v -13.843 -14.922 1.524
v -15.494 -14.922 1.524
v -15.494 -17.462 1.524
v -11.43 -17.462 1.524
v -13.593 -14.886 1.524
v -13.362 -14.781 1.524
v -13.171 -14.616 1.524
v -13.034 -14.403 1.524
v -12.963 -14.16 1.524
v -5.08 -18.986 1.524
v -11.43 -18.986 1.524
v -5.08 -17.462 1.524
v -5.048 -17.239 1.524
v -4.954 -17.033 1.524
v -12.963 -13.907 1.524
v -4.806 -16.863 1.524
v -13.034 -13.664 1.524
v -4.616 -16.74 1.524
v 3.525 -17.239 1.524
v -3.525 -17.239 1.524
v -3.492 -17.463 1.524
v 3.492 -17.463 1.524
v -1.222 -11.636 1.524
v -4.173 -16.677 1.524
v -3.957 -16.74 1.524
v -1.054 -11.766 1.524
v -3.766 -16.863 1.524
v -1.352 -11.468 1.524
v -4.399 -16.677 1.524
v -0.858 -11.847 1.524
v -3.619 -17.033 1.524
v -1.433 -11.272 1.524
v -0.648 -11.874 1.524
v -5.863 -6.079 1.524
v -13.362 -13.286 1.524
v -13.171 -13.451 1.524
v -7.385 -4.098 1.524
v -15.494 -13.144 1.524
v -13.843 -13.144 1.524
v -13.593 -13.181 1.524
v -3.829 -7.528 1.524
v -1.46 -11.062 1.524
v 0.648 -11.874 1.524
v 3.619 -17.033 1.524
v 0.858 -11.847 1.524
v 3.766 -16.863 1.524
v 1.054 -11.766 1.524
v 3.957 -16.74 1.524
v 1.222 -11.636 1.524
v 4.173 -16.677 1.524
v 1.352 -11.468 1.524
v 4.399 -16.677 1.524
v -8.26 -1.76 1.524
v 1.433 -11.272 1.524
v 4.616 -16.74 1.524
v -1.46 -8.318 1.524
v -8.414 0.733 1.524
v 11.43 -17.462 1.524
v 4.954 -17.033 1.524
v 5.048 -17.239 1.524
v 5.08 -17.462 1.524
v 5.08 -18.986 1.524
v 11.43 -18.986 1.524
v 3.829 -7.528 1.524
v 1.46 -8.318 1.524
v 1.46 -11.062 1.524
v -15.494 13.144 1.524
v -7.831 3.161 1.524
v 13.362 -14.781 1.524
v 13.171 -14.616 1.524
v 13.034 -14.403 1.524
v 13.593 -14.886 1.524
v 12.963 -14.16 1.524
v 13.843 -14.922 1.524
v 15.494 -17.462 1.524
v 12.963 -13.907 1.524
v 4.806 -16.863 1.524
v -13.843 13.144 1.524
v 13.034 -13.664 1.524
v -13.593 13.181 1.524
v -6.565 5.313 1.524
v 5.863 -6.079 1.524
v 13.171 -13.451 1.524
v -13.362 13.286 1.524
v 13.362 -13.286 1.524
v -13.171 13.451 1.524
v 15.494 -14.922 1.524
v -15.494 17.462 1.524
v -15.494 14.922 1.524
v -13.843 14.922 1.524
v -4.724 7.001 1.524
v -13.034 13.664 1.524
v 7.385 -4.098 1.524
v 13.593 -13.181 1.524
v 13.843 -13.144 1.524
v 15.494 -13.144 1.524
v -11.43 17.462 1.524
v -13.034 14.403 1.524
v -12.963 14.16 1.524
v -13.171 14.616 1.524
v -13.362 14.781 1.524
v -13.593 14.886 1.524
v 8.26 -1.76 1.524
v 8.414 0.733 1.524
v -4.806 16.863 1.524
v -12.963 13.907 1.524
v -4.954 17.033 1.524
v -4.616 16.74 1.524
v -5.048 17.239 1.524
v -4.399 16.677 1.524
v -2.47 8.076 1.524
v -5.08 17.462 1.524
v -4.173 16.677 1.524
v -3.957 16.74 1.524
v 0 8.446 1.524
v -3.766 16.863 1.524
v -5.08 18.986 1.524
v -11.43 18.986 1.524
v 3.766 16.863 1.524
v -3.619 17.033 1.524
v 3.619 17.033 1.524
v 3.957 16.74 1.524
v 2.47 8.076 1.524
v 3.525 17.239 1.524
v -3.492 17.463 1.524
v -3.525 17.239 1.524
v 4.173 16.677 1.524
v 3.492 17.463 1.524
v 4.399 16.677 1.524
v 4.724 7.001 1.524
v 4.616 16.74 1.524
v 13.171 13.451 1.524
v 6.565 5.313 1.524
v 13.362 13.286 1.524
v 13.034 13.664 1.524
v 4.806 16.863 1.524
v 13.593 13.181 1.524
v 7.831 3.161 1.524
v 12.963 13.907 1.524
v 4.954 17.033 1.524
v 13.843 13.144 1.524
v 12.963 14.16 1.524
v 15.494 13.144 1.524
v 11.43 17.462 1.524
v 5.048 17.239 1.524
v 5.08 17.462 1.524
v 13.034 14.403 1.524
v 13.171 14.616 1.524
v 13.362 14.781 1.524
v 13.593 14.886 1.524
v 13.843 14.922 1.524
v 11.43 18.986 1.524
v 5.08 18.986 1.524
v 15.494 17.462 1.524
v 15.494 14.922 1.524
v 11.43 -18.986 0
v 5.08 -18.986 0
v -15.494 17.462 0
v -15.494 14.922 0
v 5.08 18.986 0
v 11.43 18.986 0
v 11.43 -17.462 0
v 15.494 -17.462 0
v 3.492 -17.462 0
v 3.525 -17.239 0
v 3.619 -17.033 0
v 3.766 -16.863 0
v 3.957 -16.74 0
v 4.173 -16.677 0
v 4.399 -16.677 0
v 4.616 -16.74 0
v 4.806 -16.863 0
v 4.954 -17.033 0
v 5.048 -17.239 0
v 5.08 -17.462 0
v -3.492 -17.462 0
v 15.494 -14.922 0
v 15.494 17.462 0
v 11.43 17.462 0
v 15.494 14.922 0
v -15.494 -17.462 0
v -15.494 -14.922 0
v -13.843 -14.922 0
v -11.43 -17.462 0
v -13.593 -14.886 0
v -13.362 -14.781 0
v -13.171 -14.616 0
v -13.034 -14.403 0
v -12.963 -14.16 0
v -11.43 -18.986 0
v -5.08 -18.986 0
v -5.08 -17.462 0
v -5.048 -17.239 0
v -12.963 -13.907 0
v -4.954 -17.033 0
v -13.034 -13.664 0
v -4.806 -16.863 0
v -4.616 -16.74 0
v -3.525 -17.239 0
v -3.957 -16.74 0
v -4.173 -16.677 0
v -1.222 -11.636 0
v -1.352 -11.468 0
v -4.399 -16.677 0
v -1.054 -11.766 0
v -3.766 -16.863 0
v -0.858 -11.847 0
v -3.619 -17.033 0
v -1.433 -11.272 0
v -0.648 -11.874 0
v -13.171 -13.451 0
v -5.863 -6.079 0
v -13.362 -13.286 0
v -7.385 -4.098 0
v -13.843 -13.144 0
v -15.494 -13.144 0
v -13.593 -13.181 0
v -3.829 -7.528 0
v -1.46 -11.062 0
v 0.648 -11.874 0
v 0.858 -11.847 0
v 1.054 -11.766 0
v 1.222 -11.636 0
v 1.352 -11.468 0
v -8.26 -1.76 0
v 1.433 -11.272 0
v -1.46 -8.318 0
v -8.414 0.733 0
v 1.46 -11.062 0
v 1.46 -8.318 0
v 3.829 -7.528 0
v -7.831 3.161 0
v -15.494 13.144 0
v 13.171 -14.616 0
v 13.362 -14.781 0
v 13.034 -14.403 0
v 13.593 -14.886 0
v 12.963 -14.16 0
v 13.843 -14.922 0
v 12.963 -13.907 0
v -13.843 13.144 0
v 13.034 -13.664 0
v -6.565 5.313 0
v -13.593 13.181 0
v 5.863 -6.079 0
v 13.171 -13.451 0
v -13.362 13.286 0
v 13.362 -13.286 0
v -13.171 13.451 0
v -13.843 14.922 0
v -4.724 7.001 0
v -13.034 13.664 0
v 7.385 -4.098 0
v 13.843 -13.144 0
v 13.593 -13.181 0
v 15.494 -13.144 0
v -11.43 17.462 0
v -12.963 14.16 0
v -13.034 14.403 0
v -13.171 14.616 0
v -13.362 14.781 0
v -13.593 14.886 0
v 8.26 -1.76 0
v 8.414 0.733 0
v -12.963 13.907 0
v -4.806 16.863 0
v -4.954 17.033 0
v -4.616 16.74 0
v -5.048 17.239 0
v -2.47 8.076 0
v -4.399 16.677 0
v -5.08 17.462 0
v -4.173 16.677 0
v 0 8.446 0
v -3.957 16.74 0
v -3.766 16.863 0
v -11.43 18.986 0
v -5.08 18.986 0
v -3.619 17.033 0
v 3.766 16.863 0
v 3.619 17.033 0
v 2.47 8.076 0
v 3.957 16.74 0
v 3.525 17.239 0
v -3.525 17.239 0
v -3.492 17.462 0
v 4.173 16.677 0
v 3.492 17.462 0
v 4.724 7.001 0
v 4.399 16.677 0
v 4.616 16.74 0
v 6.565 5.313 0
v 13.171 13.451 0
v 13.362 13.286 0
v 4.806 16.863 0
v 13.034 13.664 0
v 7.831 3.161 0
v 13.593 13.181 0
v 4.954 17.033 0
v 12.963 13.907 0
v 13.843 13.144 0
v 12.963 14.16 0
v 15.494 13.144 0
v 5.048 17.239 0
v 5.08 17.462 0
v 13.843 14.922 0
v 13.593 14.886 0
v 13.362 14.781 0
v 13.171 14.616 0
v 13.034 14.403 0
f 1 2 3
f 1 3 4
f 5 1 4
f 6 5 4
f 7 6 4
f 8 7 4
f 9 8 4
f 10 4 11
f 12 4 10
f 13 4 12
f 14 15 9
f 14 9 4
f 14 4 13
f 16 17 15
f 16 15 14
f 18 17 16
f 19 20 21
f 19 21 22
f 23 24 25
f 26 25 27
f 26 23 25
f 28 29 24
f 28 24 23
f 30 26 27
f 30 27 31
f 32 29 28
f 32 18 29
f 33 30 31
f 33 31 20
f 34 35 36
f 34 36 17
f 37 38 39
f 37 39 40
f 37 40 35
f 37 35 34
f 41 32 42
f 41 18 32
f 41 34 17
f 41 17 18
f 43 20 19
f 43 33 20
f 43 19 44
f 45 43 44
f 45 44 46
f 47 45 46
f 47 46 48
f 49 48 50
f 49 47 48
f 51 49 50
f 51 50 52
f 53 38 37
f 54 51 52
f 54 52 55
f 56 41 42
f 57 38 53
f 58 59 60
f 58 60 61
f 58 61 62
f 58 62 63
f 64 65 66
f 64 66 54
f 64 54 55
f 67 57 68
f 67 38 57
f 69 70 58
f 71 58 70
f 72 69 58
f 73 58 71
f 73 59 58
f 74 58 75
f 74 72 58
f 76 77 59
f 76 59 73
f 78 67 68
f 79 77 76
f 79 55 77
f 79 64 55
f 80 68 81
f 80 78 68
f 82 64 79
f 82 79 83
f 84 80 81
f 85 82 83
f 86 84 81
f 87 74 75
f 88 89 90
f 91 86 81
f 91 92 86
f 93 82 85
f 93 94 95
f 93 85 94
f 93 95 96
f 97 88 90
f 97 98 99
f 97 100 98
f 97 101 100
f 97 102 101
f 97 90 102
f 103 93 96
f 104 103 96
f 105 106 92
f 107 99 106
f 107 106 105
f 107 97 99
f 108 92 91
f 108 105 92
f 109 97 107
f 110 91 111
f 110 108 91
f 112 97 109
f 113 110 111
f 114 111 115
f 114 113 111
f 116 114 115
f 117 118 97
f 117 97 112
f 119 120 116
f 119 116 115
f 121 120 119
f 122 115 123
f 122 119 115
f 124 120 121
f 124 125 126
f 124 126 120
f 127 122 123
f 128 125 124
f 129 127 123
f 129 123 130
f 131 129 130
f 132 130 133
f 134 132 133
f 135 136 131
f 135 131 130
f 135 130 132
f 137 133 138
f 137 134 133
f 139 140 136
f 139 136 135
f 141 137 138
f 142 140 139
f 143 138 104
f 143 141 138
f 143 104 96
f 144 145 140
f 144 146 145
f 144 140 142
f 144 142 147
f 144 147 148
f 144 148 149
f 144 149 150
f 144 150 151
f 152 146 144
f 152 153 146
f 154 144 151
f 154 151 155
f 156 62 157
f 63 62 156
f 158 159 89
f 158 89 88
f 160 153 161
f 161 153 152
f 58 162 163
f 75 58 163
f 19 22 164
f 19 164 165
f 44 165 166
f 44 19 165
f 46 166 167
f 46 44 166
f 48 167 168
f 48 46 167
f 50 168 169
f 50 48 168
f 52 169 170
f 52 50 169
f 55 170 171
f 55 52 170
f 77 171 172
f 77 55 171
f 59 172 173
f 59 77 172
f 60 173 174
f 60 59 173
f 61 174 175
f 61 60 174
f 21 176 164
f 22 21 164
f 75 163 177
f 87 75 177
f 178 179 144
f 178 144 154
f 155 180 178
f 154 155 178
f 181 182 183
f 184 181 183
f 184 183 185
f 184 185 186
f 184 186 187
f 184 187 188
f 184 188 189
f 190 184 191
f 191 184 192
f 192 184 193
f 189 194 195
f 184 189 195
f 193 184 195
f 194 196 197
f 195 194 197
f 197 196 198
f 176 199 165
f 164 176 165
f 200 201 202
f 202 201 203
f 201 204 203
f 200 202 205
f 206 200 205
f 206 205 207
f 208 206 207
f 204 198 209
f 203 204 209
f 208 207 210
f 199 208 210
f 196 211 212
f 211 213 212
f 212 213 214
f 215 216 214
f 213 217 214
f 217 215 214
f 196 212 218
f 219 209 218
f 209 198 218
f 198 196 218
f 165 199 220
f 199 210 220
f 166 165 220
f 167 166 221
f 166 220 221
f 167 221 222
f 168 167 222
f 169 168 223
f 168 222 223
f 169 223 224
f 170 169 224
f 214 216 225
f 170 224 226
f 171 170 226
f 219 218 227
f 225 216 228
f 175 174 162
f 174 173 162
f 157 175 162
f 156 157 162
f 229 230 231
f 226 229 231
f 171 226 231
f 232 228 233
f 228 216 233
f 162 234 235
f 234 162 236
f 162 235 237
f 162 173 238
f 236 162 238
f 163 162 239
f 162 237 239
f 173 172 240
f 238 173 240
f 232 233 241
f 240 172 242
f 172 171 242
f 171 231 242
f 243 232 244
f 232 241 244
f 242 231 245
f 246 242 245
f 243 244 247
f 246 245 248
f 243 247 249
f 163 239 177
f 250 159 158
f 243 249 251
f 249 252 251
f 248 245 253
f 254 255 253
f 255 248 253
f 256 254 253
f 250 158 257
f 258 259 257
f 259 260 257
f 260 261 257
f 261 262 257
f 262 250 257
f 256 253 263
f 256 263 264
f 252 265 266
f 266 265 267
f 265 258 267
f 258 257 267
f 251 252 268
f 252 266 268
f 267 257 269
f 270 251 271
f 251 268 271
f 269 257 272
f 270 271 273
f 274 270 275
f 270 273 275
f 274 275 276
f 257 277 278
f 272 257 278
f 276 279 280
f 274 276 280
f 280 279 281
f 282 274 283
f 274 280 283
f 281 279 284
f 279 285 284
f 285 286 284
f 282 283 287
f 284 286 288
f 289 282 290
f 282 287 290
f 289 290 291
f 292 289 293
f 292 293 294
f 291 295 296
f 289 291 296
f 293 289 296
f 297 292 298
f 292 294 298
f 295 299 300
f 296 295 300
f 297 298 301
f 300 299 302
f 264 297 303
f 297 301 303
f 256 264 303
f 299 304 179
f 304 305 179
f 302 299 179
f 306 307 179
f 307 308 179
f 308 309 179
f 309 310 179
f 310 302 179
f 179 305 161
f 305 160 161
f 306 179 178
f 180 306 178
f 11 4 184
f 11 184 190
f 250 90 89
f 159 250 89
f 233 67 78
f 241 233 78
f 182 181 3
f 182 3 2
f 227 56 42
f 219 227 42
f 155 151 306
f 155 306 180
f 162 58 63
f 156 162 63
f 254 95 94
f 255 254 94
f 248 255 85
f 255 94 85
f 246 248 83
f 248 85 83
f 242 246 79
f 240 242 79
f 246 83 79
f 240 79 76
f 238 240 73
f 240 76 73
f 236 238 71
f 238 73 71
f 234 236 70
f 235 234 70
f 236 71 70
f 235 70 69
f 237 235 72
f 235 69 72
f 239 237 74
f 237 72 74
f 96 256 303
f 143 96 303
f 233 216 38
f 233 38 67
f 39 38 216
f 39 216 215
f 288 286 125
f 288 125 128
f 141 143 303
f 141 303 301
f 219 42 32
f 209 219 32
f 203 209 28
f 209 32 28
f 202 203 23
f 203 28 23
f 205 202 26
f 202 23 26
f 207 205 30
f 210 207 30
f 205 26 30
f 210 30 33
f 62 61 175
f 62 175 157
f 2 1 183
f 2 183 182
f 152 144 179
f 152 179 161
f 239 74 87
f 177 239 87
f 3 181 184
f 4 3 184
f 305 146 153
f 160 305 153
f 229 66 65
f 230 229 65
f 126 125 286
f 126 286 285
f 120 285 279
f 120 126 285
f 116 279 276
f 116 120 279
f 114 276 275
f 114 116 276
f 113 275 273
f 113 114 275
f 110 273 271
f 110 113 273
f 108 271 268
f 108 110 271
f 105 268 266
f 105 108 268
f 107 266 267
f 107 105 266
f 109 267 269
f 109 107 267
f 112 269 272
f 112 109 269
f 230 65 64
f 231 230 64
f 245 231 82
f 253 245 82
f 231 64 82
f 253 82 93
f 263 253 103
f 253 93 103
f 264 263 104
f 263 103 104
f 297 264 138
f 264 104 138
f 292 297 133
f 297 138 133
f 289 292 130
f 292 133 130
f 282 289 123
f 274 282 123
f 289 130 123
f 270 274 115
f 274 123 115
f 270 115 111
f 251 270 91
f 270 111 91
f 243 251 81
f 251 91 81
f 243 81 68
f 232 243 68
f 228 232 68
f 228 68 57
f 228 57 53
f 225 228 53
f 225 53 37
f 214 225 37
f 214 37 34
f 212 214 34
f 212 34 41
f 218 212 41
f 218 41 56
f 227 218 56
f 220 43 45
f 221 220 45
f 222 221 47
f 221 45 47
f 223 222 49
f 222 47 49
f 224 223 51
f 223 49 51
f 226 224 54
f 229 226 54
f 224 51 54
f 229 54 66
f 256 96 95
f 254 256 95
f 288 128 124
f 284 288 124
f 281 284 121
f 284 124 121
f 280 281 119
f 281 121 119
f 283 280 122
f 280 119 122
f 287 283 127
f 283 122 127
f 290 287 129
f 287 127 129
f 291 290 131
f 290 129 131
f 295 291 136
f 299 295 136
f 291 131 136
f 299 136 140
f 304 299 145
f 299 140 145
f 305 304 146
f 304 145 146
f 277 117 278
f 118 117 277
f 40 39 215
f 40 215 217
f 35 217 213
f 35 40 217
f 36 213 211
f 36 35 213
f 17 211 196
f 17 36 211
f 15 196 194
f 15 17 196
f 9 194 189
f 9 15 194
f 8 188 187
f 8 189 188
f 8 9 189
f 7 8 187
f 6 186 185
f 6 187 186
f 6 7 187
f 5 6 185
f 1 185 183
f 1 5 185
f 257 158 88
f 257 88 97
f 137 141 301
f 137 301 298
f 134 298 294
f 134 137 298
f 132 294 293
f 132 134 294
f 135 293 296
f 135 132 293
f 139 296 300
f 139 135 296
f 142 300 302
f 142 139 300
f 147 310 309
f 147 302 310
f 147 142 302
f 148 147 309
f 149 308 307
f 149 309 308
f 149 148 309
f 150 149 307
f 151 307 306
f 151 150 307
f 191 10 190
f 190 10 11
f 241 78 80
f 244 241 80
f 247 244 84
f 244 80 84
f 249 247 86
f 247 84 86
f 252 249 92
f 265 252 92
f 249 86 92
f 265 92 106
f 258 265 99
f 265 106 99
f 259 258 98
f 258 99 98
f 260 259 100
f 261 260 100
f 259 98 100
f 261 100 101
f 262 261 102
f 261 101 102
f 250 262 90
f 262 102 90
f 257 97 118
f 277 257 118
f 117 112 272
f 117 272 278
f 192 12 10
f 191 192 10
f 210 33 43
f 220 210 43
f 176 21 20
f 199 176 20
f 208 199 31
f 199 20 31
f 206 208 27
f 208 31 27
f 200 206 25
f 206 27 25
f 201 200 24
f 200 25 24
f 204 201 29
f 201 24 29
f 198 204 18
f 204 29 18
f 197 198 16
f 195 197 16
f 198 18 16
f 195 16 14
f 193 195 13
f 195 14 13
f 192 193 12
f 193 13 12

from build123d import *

# Parameters (mm, degrees)
SKETCH1_W               = 30.988
SKETCH1_H               = 34.925
BOSS_EXTRUDE1_DEPTH     = 1.524
SKETCH2_R               = 8.4455
CUT_EXTRUDE1_DEPTH      = 24.39498917
CUT_EXTRUDE2_DEPTH      = 24.39498917
SKETCH4_W               = 6.35
SKETCH4_H               = 1.524
BOSS_EXTRUDE2_DEPTH     = 1.524
SKETCH4_3_R             = 0.79375
CUT_EXTRUDE3_DEPTH      = 25.553488433
MIRROR4_COPY_1_DEPTH    = 24.39498917
MIRROR4_COPY_2_SKETCH_W = 6.35
MIRROR4_COPY_2_SKETCH_H = 1.524
MIRROR4_COPY_2_DEPTH    = 1.524
MIRROR4_COPY_3_SKETCH_R = 0.79375
MIRROR4_COPY_3_DEPTH    = 25.553488433


with BuildPart() as part:
    # Sketch1 → Boss-Extrude1 (new body)
    with BuildSketch(Plane.XY):
        Rectangle(SKETCH1_W, SKETCH1_H)
    extrude(amount=BOSS_EXTRUDE1_DEPTH)

    # Sketch2 → Cut-Extrude1 (cut, through all)
    with BuildSketch(Plane.XY.offset(1.524)):
        Circle(SKETCH2_R)
        with BuildLine():
            ThreePointArc((1.4605, -8.31825763), (0, -8.4455), (-1.4605, -8.31825763))
            Line((-1.4605, -8.31825763), (-1.4605, -11.0617))
            ThreePointArc((-1.4605, -11.0617), (-1.222436392, -11.636436392), (-0.6477, -11.8745))
            Line((-0.6477, -11.8745), (0.6477, -11.8745))
            ThreePointArc((0.6477, -11.8745), (1.222436392, -11.636436392), (1.4605, -11.0617))
            Line((1.4605, -11.0617), (1.4605, -8.31825763))
        make_face()
    extrude(amount=-CUT_EXTRUDE1_DEPTH, mode=Mode.SUBTRACT)

    # Sketch3 → Cut-Extrude2 (cut, through all)
    with BuildSketch(Plane.XY.offset(1.524)):
        with BuildLine():
            Line((15.494, 13.1445), (13.843, 13.1445))
            ThreePointArc((13.843, 13.1445), (12.954, 14.0335), (13.843, 14.9225))
            Line((13.843, 14.9225), (15.494, 14.9225))
            ThreePointArc((15.494, 14.9225), (16.383, 14.0335), (15.494, 13.1445))
        make_face()
    cut_extrude2 = extrude(amount=-CUT_EXTRUDE2_DEPTH, mode=Mode.SUBTRACT)

    # Sketch4 → Boss-Extrude2 (add)
    with BuildSketch(Plane.XY.offset(1.524)):
        with Locations((8.255, 18.2245)):
            Rectangle(SKETCH4_W, SKETCH4_H)
    boss_extrude2 = extrude(amount=-BOSS_EXTRUDE2_DEPTH)

    # Sketch4<3> → Cut-Extrude3 (cut, through all)
    with BuildSketch(Plane.XY.offset(1.524)):
        with Locations((4.28625, 17.4625)):
            Circle(SKETCH4_3_R)
    cut_extrude3 = extrude(amount=-CUT_EXTRUDE3_DEPTH, mode=Mode.SUBTRACT)

    # Mirror3: Cut-Extrude2, Boss-Extrude2, Cut-Extrude3 across plane
    add(cut_extrude2.mirror(Plane.ZX), mode=Mode.SUBTRACT)
    add(boss_extrude2.mirror(Plane.ZX))
    add(cut_extrude3.mirror(Plane.ZX), mode=Mode.SUBTRACT)

    # Mirror4: Cut-Extrude2, Boss-Extrude2, Cut-Extrude3 across plane
    add(cut_extrude2.mirror(Plane(origin=(0, 0, 0), x_dir=(0, 0, 1), z_dir=(1, 0, 0))), mode=Mode.SUBTRACT)
    add(boss_extrude2.mirror(Plane(origin=(0, 0, 0), x_dir=(0, 0, 1), z_dir=(1, 0, 0))))
    add(cut_extrude3.mirror(Plane(origin=(0, 0, 0), x_dir=(0, 0, 1), z_dir=(1, 0, 0))), mode=Mode.SUBTRACT)

    # Mirror4 copy 1 sketch → Mirror4 copy 1 (cut, through all)
    with BuildSketch(Plane(origin=(0, 0, 1.524), x_dir=(-1, 0, 0), z_dir=(0, 0, 1))):
        with BuildLine():
            Line((15.494, 13.1445), (13.843, 13.1445))
            ThreePointArc((13.843, 13.1445), (12.954, 14.0335), (13.843, 14.9225))
            Line((13.843, 14.9225), (15.494, 14.9225))
            ThreePointArc((15.494, 14.9225), (16.383, 14.0335), (15.494, 13.1445))
        make_face()
    extrude(amount=-MIRROR4_COPY_1_DEPTH, mode=Mode.SUBTRACT)

    # Mirror4 copy 2 sketch → Mirror4 copy 2 (add)
    with BuildSketch(Plane(origin=(0, 0, 1.524), x_dir=(-1, 0, 0), z_dir=(0, 0, 1))):
        with Locations((8.255, 18.2245)):
            Rectangle(MIRROR4_COPY_2_SKETCH_W, MIRROR4_COPY_2_SKETCH_H)
    extrude(amount=-MIRROR4_COPY_2_DEPTH)

    # Mirror4 copy 3 sketch → Mirror4 copy 3 (cut, through all)
    with BuildSketch(Plane(origin=(0, 0, 1.524), x_dir=(-1, 0, 0), z_dir=(0, 0, 1))):
        with Locations((4.28625, 17.4625)):
            Circle(MIRROR4_COPY_3_SKETCH_R)
    extrude(amount=-MIRROR4_COPY_3_DEPTH, mode=Mode.SUBTRACT)


solid = part.part
